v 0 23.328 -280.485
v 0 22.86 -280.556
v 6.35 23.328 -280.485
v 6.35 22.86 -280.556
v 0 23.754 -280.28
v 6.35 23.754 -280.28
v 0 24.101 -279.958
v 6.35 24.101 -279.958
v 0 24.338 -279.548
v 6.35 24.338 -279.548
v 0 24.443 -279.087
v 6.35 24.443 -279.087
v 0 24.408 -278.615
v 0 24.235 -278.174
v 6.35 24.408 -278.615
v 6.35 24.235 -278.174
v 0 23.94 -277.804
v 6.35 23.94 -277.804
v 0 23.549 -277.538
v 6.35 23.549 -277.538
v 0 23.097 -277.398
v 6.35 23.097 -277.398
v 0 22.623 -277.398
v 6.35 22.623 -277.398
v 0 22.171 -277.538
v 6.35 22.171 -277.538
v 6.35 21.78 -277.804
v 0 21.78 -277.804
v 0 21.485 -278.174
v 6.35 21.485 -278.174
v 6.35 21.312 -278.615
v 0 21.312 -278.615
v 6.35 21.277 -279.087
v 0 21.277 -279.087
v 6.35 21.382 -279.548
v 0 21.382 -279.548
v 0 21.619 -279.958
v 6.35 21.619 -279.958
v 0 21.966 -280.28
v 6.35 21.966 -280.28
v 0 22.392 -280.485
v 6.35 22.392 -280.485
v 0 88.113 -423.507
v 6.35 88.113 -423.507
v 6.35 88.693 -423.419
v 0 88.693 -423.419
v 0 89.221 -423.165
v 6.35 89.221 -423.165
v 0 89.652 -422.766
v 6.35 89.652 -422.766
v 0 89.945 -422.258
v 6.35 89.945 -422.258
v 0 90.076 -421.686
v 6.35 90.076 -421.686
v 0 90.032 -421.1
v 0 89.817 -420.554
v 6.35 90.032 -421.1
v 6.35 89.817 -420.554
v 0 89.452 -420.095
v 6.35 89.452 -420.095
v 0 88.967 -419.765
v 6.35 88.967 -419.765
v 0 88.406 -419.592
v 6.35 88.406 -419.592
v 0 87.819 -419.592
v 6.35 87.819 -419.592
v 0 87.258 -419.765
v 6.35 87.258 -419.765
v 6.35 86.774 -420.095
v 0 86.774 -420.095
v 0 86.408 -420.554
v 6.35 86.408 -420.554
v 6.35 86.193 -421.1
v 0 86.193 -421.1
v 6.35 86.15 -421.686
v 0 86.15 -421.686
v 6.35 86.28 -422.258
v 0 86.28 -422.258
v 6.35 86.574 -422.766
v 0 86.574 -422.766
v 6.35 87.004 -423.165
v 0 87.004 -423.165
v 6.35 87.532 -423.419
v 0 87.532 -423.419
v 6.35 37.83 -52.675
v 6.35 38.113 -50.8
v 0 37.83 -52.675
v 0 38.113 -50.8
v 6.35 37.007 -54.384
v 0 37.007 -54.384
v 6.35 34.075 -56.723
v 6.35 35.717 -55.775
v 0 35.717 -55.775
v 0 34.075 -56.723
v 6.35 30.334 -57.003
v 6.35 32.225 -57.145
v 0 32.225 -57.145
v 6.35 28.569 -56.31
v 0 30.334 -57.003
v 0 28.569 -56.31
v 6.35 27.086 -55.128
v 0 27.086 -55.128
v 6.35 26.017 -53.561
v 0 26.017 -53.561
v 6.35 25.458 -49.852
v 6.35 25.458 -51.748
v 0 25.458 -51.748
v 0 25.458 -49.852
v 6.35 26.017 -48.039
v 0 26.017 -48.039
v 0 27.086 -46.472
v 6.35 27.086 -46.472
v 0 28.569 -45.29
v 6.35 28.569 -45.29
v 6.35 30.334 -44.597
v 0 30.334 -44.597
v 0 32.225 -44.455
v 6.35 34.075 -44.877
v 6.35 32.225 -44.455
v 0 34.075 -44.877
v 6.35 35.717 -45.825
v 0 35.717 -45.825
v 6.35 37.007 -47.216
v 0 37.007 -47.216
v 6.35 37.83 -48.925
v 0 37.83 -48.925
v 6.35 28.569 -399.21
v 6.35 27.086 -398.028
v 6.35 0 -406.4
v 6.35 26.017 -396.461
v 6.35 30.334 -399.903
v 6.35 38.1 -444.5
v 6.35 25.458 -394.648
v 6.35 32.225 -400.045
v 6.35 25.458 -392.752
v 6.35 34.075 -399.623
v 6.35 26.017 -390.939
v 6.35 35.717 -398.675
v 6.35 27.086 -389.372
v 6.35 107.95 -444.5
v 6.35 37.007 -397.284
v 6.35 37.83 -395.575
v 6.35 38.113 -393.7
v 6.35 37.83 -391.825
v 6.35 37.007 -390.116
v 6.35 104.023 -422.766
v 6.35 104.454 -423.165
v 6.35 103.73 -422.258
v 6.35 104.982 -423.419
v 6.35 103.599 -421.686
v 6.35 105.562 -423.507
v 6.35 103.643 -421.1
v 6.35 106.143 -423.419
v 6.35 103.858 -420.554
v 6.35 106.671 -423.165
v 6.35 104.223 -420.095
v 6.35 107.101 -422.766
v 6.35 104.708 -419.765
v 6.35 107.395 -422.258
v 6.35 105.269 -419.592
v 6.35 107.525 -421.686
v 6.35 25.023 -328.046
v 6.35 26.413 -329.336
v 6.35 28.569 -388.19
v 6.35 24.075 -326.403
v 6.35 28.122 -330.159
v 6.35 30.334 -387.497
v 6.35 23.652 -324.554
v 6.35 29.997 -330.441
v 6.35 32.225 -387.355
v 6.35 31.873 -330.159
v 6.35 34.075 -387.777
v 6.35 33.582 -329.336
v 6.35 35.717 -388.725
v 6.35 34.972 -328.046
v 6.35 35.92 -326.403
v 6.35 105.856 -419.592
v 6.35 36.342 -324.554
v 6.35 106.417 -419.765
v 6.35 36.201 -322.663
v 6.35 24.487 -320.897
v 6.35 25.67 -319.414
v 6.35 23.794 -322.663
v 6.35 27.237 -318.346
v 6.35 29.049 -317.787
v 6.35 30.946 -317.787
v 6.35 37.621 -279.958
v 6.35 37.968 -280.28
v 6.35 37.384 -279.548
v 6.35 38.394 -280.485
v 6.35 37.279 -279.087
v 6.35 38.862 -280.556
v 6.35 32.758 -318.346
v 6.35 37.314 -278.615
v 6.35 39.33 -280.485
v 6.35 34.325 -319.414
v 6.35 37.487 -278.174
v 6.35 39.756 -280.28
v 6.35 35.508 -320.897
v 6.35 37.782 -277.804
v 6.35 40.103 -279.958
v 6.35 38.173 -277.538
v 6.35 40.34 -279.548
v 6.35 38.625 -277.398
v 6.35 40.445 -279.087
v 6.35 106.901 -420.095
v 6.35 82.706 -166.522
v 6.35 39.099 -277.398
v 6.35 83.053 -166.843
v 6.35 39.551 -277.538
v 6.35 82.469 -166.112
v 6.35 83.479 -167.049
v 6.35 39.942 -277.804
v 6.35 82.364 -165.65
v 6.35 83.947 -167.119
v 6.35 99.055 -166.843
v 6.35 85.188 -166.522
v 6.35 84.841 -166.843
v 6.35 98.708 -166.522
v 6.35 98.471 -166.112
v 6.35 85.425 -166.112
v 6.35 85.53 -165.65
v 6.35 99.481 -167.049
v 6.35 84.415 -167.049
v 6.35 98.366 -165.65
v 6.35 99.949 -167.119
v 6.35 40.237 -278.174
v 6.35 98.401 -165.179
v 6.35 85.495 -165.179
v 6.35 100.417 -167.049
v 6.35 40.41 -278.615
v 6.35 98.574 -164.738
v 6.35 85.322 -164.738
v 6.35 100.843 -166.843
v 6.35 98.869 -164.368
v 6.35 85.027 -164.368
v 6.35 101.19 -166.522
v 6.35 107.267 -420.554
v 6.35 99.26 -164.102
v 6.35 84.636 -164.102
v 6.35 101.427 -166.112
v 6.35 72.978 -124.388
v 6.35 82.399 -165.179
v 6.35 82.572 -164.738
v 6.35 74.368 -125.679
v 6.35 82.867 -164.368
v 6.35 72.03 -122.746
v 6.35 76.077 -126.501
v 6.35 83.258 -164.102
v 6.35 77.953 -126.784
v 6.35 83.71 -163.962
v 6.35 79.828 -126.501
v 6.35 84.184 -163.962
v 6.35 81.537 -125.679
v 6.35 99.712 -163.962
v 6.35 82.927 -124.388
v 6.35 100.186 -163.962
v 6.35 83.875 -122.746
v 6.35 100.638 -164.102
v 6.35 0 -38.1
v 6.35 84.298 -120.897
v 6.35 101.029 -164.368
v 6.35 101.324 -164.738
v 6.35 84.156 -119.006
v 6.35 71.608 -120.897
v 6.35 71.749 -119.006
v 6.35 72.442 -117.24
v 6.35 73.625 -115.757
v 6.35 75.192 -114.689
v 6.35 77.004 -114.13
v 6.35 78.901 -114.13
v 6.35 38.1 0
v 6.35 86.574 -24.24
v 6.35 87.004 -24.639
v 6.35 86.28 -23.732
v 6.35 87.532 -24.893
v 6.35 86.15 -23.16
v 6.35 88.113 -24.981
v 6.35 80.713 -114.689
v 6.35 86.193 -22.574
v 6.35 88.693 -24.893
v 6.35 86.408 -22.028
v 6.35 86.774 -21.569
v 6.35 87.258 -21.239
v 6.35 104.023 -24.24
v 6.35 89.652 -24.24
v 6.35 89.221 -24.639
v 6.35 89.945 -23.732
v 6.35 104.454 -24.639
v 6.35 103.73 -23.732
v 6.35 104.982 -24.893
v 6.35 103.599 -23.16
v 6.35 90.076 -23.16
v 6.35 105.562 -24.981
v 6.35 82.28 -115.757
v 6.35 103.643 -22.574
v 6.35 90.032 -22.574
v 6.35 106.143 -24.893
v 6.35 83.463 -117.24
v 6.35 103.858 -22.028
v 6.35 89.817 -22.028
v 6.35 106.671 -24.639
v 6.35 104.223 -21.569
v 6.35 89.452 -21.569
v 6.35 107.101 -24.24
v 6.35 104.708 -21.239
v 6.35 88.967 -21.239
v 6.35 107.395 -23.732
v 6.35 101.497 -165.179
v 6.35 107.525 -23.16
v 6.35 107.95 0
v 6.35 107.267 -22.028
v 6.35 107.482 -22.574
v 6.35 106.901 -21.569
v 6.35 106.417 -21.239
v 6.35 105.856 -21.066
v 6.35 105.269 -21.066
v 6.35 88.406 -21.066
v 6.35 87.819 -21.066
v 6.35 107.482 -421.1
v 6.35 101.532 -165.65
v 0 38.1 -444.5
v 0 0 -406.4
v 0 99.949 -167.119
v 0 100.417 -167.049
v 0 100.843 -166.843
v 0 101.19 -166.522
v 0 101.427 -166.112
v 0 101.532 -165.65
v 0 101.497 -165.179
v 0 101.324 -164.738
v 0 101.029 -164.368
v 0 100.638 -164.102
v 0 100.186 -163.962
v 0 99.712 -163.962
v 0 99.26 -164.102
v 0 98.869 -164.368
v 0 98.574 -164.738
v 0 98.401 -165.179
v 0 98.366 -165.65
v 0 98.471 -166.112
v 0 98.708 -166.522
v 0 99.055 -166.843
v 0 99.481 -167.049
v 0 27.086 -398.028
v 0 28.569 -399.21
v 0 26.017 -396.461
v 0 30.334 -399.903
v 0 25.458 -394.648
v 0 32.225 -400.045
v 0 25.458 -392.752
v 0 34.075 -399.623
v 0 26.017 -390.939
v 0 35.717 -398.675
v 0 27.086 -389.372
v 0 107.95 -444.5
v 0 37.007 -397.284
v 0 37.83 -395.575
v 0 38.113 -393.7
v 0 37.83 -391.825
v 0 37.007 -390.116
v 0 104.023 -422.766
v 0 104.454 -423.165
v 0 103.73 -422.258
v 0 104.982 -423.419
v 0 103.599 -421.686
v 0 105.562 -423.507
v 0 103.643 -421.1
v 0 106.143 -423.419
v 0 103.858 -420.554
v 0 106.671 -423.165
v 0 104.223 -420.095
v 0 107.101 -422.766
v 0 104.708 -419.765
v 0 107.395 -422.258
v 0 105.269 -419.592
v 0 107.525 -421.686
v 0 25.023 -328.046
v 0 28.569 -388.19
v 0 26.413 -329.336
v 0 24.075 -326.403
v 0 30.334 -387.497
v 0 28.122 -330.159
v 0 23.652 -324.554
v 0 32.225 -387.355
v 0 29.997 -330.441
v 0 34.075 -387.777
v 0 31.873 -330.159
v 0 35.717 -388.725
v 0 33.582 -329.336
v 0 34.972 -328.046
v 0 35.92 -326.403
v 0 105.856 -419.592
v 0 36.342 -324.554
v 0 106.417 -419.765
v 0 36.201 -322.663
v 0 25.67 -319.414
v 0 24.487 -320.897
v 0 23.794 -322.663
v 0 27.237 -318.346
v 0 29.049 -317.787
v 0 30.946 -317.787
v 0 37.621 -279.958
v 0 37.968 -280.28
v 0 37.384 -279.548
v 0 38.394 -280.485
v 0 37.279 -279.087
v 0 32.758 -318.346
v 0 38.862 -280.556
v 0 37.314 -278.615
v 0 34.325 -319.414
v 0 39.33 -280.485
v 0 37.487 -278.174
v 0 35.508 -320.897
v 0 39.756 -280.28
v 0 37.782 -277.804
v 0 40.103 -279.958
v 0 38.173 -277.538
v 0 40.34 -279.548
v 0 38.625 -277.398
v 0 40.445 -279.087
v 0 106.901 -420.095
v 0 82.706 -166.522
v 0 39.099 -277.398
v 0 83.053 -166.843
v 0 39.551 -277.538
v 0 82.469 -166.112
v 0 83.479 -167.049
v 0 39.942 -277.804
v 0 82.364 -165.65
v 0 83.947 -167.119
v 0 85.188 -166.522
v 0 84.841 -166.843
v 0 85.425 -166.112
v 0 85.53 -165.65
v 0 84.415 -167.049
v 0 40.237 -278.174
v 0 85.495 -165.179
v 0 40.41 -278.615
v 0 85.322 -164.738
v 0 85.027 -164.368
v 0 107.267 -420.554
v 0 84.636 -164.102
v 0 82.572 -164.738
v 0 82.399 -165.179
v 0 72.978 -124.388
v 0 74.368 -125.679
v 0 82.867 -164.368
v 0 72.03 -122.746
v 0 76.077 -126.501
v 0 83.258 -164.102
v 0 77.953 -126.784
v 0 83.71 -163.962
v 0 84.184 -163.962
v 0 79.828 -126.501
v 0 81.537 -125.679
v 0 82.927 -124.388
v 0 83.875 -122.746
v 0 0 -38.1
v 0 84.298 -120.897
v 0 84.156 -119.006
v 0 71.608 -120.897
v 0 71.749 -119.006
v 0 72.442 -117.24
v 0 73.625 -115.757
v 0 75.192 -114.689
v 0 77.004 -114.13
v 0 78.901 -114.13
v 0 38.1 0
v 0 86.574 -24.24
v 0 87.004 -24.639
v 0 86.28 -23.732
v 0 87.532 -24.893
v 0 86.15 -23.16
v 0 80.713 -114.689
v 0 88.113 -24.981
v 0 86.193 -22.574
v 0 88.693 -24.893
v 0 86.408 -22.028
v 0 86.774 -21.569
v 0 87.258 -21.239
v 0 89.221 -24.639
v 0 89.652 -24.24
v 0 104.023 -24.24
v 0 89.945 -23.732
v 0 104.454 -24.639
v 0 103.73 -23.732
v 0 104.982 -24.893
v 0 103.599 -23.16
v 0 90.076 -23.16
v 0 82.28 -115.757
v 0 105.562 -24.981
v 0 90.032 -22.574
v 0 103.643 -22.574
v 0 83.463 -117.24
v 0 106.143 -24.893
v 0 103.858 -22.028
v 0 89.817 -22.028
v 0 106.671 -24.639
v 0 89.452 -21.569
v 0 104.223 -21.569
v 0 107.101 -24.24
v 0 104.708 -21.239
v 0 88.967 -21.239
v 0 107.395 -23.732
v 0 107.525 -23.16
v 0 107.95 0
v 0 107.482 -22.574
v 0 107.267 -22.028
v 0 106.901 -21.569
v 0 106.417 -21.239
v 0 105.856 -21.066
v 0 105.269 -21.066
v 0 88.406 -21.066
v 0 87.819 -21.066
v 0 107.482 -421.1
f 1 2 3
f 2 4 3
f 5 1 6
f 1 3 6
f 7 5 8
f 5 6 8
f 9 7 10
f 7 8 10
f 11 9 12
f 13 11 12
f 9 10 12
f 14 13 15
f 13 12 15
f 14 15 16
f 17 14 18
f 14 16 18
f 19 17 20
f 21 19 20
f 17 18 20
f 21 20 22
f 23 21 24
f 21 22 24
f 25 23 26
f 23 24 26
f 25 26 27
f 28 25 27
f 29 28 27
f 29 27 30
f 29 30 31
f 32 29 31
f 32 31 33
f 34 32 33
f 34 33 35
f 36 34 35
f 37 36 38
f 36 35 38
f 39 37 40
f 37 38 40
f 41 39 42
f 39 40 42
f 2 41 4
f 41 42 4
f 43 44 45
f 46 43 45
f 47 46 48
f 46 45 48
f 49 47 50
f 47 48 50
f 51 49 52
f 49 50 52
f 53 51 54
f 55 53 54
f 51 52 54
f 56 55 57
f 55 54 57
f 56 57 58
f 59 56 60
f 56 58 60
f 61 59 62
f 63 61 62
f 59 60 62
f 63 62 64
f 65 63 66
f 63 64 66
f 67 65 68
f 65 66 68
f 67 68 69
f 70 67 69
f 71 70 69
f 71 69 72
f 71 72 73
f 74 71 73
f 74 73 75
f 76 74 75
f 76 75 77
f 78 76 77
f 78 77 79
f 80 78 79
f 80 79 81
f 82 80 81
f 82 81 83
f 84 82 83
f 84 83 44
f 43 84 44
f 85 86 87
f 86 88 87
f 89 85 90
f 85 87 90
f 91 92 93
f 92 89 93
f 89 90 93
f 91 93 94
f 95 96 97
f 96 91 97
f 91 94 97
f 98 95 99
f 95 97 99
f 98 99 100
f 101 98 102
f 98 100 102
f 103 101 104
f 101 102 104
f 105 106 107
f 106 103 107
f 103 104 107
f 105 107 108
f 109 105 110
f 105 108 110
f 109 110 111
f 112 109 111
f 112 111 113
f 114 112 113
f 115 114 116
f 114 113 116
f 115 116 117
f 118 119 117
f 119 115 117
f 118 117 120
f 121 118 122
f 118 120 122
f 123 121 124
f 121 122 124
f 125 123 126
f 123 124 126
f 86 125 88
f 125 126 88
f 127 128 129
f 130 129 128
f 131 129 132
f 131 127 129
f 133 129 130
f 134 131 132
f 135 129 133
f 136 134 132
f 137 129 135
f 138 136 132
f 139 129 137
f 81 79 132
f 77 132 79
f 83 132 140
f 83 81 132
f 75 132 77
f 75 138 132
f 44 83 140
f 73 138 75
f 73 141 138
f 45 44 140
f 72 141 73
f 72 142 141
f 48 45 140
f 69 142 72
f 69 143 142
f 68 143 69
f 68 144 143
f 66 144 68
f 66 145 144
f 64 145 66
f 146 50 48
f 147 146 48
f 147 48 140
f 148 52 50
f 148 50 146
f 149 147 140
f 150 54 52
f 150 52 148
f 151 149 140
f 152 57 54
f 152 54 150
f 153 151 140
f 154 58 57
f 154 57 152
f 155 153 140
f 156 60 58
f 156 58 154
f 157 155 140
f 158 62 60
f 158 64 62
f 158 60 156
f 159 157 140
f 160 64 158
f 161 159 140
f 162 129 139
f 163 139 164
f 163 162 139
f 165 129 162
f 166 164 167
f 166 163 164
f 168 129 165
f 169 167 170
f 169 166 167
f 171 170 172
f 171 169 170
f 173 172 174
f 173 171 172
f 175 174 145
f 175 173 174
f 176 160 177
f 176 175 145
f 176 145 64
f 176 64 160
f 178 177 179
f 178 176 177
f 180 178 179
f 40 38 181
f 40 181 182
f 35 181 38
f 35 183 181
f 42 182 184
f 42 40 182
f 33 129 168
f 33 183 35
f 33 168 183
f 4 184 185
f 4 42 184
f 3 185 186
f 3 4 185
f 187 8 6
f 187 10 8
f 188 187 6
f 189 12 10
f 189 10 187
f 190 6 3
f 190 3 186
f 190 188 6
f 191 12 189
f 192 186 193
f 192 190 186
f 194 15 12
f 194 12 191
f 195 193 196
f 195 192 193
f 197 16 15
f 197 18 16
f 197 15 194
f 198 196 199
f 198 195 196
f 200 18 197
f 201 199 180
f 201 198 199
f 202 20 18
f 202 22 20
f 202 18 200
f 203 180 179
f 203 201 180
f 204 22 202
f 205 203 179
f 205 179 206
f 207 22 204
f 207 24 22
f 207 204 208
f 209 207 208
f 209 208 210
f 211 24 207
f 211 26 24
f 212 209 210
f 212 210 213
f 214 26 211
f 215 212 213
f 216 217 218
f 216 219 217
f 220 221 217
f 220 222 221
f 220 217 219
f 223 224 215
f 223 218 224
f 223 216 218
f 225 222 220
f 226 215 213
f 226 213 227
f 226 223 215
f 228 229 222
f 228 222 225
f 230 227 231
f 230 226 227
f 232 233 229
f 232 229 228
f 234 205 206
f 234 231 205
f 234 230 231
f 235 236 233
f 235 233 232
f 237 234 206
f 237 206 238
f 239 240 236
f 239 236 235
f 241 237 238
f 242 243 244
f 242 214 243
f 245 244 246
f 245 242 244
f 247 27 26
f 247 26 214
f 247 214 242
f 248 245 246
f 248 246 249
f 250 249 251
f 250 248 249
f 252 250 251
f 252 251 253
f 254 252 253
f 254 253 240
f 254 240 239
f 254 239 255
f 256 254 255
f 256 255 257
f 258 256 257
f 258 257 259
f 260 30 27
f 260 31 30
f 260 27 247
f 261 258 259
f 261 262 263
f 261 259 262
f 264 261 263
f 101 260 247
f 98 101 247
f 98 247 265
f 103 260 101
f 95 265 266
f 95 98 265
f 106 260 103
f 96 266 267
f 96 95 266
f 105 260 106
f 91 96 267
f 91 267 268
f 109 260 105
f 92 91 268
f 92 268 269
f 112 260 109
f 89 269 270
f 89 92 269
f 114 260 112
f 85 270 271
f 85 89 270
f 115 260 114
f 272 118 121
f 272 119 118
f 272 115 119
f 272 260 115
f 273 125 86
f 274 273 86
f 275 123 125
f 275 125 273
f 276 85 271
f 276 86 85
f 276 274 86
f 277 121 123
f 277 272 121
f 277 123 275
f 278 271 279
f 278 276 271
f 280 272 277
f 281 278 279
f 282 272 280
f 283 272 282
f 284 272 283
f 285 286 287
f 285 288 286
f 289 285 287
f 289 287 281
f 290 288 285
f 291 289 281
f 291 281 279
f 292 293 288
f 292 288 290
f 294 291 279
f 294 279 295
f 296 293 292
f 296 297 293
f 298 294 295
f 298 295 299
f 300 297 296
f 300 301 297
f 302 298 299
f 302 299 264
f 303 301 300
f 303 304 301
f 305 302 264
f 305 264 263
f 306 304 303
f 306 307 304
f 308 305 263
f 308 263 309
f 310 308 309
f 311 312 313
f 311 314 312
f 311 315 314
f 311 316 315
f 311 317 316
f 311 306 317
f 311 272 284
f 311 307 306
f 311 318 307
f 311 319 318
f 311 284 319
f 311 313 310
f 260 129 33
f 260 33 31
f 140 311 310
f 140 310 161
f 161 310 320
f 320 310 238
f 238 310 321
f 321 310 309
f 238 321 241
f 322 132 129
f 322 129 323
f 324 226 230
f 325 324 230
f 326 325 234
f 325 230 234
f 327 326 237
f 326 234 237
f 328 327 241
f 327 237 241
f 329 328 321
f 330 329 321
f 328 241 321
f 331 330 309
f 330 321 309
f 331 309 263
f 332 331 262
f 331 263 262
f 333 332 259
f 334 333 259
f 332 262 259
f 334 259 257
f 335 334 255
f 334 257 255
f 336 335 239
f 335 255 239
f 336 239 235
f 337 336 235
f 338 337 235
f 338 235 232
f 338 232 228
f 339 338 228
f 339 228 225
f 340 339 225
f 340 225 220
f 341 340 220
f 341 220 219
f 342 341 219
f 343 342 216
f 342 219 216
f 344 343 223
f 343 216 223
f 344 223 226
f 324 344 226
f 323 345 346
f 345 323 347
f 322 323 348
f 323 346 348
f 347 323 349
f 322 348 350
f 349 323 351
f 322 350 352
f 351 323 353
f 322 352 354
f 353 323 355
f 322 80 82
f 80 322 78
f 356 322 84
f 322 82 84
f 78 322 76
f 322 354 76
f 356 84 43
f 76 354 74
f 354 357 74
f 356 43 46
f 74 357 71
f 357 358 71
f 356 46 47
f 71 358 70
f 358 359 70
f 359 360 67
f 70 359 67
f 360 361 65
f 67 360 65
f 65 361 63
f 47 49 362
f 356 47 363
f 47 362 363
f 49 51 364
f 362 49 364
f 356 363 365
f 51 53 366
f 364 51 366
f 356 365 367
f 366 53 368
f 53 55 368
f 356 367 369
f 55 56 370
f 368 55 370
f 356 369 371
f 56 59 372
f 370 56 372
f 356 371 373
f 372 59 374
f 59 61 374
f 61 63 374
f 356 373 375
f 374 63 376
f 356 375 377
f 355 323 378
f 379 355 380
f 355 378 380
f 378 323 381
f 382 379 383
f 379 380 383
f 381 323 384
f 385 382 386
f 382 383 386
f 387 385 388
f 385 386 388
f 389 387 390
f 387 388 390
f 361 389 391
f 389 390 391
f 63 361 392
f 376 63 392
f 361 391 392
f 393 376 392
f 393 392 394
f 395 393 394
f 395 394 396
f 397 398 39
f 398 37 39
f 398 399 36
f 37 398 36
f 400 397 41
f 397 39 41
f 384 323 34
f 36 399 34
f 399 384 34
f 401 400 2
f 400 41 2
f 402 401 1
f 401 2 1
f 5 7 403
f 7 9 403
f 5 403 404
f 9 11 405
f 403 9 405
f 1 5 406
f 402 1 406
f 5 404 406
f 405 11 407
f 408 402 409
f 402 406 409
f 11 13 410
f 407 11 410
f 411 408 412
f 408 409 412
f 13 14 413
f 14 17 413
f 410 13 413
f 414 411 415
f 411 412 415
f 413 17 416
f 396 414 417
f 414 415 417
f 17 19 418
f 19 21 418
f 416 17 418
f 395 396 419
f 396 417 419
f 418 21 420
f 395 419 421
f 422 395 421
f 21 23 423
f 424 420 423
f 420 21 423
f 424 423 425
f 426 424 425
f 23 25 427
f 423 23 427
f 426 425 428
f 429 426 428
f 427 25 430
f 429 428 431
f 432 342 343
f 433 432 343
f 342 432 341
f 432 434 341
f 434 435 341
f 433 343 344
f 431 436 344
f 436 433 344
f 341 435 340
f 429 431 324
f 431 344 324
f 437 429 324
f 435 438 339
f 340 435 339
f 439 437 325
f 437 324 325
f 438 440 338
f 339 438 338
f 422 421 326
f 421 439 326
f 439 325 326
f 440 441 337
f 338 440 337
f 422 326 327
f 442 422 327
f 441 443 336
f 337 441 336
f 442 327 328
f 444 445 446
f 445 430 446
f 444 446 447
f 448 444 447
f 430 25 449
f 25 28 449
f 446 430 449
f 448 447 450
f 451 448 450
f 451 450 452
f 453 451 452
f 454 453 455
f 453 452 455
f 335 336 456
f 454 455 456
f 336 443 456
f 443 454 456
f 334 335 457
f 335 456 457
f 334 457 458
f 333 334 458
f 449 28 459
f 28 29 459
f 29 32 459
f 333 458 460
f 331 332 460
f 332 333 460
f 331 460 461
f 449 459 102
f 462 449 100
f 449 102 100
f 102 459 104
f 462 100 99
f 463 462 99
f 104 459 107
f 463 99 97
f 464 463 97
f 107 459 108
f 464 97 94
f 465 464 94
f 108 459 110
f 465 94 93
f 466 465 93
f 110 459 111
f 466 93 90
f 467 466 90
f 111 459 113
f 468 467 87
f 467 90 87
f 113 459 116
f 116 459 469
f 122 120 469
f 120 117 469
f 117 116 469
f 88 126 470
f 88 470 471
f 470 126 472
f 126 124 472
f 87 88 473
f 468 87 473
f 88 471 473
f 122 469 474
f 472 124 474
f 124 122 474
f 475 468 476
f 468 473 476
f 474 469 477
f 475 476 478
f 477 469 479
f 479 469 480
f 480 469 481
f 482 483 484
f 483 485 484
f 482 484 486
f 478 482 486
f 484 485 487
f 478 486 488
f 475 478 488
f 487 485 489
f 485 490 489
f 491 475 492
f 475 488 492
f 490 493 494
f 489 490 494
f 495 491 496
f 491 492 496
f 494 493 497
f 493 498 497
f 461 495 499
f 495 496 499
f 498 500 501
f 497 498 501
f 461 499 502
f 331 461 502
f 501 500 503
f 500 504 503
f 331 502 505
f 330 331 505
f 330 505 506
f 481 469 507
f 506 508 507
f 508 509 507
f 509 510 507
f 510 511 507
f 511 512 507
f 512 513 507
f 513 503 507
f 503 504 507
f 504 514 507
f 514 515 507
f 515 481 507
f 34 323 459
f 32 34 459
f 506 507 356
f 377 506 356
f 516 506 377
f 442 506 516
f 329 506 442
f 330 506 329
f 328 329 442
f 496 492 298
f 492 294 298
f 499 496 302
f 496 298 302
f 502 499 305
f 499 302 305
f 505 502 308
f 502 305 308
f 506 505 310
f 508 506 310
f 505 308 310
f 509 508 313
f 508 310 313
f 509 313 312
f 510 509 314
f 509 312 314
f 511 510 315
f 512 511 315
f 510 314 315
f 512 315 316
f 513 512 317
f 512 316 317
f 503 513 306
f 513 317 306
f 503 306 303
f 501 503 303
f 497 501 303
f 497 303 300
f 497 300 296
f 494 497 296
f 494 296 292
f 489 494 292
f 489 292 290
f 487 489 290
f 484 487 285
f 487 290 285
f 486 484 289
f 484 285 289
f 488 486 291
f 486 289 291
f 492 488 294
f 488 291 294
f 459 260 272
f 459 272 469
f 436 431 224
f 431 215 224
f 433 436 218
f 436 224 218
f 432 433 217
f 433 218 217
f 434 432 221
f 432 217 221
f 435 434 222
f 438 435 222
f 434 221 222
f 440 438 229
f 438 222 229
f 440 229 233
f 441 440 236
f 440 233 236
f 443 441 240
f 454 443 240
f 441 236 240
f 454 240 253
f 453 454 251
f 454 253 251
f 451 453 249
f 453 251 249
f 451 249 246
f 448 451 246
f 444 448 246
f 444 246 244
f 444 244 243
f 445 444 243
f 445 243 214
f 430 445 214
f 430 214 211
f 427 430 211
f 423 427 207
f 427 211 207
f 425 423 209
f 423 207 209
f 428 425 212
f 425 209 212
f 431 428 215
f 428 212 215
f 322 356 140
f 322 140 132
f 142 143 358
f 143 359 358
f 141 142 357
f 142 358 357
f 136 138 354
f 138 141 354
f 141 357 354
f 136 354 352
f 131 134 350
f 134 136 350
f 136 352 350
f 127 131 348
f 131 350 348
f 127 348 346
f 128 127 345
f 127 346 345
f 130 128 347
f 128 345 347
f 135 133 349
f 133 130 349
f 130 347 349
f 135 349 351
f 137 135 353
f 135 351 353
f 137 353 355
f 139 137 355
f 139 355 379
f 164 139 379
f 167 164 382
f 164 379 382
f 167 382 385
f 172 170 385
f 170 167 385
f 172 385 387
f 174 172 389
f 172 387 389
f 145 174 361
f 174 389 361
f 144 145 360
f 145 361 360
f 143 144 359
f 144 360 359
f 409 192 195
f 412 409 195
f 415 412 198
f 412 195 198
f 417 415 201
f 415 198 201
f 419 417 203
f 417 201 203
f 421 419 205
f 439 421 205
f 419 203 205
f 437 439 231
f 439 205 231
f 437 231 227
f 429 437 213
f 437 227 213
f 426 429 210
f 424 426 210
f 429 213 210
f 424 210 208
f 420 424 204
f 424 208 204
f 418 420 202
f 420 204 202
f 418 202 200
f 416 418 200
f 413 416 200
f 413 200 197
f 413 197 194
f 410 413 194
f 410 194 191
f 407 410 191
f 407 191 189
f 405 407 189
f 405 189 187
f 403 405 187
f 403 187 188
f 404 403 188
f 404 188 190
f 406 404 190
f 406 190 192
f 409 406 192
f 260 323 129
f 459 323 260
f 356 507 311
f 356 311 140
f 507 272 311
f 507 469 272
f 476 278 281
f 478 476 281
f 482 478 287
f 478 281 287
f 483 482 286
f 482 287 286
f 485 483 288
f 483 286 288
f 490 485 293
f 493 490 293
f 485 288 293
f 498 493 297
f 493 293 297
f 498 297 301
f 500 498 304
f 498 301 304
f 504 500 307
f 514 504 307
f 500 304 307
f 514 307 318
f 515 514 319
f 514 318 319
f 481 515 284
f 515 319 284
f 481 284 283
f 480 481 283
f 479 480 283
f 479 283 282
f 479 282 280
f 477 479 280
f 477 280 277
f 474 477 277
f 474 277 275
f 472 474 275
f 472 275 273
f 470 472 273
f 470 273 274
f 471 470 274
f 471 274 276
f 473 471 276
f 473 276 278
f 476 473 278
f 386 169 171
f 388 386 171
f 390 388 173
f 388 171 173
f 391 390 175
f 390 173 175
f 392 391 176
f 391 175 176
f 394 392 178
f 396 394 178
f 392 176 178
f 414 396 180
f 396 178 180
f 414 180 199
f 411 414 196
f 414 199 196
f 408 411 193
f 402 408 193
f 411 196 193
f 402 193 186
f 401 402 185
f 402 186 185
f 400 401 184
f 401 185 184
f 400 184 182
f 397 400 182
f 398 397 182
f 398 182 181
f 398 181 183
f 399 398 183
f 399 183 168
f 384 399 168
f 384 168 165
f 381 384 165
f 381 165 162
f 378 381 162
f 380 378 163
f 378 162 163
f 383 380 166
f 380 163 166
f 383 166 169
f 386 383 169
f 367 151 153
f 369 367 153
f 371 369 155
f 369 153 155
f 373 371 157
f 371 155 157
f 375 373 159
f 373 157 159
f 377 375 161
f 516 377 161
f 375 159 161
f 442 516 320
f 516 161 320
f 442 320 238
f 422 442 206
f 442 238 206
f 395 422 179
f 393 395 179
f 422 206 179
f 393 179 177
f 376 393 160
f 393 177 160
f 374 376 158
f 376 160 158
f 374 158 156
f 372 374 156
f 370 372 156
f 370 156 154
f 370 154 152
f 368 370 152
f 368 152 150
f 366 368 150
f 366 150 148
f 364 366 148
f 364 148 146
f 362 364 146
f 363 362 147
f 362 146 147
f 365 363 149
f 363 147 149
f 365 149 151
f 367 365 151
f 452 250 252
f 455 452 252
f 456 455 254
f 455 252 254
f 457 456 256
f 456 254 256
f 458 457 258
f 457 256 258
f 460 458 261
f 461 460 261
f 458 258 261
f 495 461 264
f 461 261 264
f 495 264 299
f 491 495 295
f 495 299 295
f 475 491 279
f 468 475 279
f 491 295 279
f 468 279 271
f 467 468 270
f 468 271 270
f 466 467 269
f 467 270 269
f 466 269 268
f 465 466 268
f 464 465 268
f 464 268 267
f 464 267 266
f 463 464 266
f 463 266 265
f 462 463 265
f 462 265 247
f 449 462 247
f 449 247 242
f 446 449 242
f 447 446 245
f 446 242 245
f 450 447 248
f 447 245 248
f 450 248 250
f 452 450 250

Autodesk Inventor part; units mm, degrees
ref_plane "YZ Plane" through (0, 0, 0) normal (1, 0, 0) x (0, 1, 0)
ref_plane "XZ Plane" through (0, 0, 0) normal (0, 1, 0) x (-1, 0, 0)
ref_plane "XY Plane" through (0, 0, 0) normal (0, 0, 1) x (1, 0, 0)
sketch "Sketch1" plane through (0, 0, 0) normal (1, 0, 0) x (0, 1, 0)
  line L0 (0, 0) -> (107.95, 0)
  line L1 (107.95, 0) -> (107.95, -444.5)
  line L2 (107.95, -444.5) -> (0, -444.5)
  line L3 (0, -444.5) -> (0, 0)
  circle A0 centre (31.75, -50.8) radius 6.3627
  circle A1 centre (31.75, -393.7) radius 6.3627
  circle A2 centre (92.6338, -165.5318) radius 1.5875
  circle A3 centre (76.6318, -165.5318) radius 1.5875
  circle A4 centre (15.3162, -278.9682) radius 1.5875
  circle A5 centre (31.3182, -278.9682) radius 1.5875
  dimension "d0" = 107.95
  dimension "d1" = 444.5
  dimension "d2" = 12.7254
  dimension "d3" = 31.75
  dimension "d4" = 50.8
  dimension "d5" = 50.8
  dimension "d22" = 165.5318
  dimension "d23" = 3.175
  dimension "d24" = 15.3162
  dimension "d25" = 3.175
  dimension "d26" = 16.002
  dimension "d27" = 165.5318
  dimension "d28" = 3.175
  dimension "d29" = 15.3162
  dimension "d30" = 165.5318
  dimension "d31" = 3.175
  dimension "d32" = 16.002
  dimension "d33" = 165.5318
extrude "Extrusion1" add sketch "Sketch1" along normal blind 6.35 contours L0 L1 L2 L3 | A2 | A3 | A4 | A5
chamfer "Chamfer1" distance 38.1 angle 45 1 edges at (3.175, 0, 0)
chamfer "Chamfer2" distance 38.1 angle 45 1 edges at (3.175, 0, -444.5)
sketch "Sketch2" plane through (6.35, 0, 0) normal (1, 0, 0) x (0, 0, -1)
  line L0 (444.5, 38.1) -> (406.4, 0) projected
  line L1 (444.5, 38.1) -> (444.5, 107.95) projected
  line L2 (444.5, 107.95) -> (0, 107.95) projected
  line L3 (0, 107.95) -> (0, 38.1) projected
  line L4 (38.1, 0) -> (0, 38.1) projected
  line L5 (38.1, 0) -> (406.4, 0) projected
  circle A0 centre (393.7, 31.75) radius 6.3627 projected
  circle A1 centre (50.8, 31.75) radius 6.3627 projected
  circle A2 centre (120.4214, 77.9526) radius 6.3627
  circle A3 centre (324.0786, 29.9974) radius 6.3627
  point P0 (0, 0)
  dimension "d14" = 12.7254
  dimension "d15" = 120.4214
  dimension "d16" = 29.9974
  dimension "d17" = 12.7254
  dimension "d18" = 29.9974
  dimension "d19" = 120.4214
extrude "Extrusion2" cut sketch "Sketch2" against normal blind 25.4 contours A2 | A3
sketch "Sketch3" plane through (6.35, 0, 0) normal (1, 0, 0) x (0, 0, -1)
  circle A0 centre (120.4214, 77.9526) radius 6.3627 projected
  circle A1 centre (324.0786, 29.9974) radius 6.3627 projected
  line L0 (444.5, 38.1) -> (406.4, 0) projected
  line L1 (444.5, 38.1) -> (444.5, 107.95) projected
  line L2 (444.5, 107.95) -> (0, 107.95) projected
  line L3 (0, 107.95) -> (0, 38.1) projected
  line L4 (38.1, 0) -> (0, 38.1) projected
  line L5 (38.1, 0) -> (406.4, 0) projected
  circle A2 centre (393.7, 31.75) radius 6.3627 projected
  circle A3 centre (50.8, 31.75) radius 6.3627 projected
  circle A4 centre (165.5318, 99.949) radius 1.5875
  circle A5 centre (165.5318, 83.947) radius 1.5875
  circle A6 centre (278.9682, 22.86) radius 1.5875
  circle A7 centre (278.9682, 38.862) radius 1.5875
  point P0 (0, 0)
  dimension "d34" = 3.175
  dimension "d35" = 165.5318
  dimension "d36" = 8.001
  dimension "d37" = 3.175
  dimension "d38" = 16.002
  dimension "d39" = 3.175
  dimension "d40" = 3.175
  dimension "d41" = 22.86
  dimension "d42" = 16.002
  dimension "d43" = 165.5318
extrude "Extrusion3" cut sketch "Sketch3" against normal blind 25.4 contours A4 | A5 | A6 | A7
sketch "Sketch5" plane through (6.35, 0, 0) normal (1, 0, 0) x (0, 0, -1)
  circle A0 centre (278.9682, 22.86) radius 1.5875 projected
  circle A1 centre (165.5318, 99.949) radius 1.5875 projected
  circle A2 centre (165.5318, 83.947) radius 1.5875 projected
  circle A3 centre (278.9682, 38.862) radius 1.5875 projected
  circle A4 centre (120.4214, 77.9526) radius 6.3627 projected
  circle A5 centre (324.0786, 29.9974) radius 6.3627 projected
  line L0 (444.5, 38.1) -> (406.4, 0) projected
  line L1 (444.5, 38.1) -> (444.5, 107.95) projected
  line L2 (444.5, 107.95) -> (0, 107.95) projected
  line L3 (0, 107.95) -> (0, 38.1) projected
  line L4 (38.1, 0) -> (0, 38.1) projected
  line L5 (38.1, 0) -> (406.4, 0) projected
  circle A6 centre (393.7, 31.75) radius 6.3627 projected
  circle A7 centre (50.8, 31.75) radius 6.3627 projected
  circle A8 centre (23.0124, 105.5624) radius 1.9685
  circle A9 centre (23.0124, 88.1126) radius 1.9685
  circle A10 centre (421.5384, 105.5624) radius 1.9685
  circle A11 centre (421.5384, 88.1126) radius 1.9685
  point P0 (0, 0)
  dimension "d59" = 3.937
  dimension "d60" = 23.0124
  dimension "d61" = 2.3876
  dimension "d62" = 3.937
  dimension "d64" = 3.937
  dimension "d65" = 3.937
  dimension "d66" = 2.3876
  dimension "d68" = 22.9616
  dimension "d71" = 19.8374
  dimension "d72" = 19.8374
extrude "Extrusion5" cut sketch "Sketch5" against normal blind 25.4 contours A8 | A9 | A10 | A11
properties part number "DriveTrain3.0"
